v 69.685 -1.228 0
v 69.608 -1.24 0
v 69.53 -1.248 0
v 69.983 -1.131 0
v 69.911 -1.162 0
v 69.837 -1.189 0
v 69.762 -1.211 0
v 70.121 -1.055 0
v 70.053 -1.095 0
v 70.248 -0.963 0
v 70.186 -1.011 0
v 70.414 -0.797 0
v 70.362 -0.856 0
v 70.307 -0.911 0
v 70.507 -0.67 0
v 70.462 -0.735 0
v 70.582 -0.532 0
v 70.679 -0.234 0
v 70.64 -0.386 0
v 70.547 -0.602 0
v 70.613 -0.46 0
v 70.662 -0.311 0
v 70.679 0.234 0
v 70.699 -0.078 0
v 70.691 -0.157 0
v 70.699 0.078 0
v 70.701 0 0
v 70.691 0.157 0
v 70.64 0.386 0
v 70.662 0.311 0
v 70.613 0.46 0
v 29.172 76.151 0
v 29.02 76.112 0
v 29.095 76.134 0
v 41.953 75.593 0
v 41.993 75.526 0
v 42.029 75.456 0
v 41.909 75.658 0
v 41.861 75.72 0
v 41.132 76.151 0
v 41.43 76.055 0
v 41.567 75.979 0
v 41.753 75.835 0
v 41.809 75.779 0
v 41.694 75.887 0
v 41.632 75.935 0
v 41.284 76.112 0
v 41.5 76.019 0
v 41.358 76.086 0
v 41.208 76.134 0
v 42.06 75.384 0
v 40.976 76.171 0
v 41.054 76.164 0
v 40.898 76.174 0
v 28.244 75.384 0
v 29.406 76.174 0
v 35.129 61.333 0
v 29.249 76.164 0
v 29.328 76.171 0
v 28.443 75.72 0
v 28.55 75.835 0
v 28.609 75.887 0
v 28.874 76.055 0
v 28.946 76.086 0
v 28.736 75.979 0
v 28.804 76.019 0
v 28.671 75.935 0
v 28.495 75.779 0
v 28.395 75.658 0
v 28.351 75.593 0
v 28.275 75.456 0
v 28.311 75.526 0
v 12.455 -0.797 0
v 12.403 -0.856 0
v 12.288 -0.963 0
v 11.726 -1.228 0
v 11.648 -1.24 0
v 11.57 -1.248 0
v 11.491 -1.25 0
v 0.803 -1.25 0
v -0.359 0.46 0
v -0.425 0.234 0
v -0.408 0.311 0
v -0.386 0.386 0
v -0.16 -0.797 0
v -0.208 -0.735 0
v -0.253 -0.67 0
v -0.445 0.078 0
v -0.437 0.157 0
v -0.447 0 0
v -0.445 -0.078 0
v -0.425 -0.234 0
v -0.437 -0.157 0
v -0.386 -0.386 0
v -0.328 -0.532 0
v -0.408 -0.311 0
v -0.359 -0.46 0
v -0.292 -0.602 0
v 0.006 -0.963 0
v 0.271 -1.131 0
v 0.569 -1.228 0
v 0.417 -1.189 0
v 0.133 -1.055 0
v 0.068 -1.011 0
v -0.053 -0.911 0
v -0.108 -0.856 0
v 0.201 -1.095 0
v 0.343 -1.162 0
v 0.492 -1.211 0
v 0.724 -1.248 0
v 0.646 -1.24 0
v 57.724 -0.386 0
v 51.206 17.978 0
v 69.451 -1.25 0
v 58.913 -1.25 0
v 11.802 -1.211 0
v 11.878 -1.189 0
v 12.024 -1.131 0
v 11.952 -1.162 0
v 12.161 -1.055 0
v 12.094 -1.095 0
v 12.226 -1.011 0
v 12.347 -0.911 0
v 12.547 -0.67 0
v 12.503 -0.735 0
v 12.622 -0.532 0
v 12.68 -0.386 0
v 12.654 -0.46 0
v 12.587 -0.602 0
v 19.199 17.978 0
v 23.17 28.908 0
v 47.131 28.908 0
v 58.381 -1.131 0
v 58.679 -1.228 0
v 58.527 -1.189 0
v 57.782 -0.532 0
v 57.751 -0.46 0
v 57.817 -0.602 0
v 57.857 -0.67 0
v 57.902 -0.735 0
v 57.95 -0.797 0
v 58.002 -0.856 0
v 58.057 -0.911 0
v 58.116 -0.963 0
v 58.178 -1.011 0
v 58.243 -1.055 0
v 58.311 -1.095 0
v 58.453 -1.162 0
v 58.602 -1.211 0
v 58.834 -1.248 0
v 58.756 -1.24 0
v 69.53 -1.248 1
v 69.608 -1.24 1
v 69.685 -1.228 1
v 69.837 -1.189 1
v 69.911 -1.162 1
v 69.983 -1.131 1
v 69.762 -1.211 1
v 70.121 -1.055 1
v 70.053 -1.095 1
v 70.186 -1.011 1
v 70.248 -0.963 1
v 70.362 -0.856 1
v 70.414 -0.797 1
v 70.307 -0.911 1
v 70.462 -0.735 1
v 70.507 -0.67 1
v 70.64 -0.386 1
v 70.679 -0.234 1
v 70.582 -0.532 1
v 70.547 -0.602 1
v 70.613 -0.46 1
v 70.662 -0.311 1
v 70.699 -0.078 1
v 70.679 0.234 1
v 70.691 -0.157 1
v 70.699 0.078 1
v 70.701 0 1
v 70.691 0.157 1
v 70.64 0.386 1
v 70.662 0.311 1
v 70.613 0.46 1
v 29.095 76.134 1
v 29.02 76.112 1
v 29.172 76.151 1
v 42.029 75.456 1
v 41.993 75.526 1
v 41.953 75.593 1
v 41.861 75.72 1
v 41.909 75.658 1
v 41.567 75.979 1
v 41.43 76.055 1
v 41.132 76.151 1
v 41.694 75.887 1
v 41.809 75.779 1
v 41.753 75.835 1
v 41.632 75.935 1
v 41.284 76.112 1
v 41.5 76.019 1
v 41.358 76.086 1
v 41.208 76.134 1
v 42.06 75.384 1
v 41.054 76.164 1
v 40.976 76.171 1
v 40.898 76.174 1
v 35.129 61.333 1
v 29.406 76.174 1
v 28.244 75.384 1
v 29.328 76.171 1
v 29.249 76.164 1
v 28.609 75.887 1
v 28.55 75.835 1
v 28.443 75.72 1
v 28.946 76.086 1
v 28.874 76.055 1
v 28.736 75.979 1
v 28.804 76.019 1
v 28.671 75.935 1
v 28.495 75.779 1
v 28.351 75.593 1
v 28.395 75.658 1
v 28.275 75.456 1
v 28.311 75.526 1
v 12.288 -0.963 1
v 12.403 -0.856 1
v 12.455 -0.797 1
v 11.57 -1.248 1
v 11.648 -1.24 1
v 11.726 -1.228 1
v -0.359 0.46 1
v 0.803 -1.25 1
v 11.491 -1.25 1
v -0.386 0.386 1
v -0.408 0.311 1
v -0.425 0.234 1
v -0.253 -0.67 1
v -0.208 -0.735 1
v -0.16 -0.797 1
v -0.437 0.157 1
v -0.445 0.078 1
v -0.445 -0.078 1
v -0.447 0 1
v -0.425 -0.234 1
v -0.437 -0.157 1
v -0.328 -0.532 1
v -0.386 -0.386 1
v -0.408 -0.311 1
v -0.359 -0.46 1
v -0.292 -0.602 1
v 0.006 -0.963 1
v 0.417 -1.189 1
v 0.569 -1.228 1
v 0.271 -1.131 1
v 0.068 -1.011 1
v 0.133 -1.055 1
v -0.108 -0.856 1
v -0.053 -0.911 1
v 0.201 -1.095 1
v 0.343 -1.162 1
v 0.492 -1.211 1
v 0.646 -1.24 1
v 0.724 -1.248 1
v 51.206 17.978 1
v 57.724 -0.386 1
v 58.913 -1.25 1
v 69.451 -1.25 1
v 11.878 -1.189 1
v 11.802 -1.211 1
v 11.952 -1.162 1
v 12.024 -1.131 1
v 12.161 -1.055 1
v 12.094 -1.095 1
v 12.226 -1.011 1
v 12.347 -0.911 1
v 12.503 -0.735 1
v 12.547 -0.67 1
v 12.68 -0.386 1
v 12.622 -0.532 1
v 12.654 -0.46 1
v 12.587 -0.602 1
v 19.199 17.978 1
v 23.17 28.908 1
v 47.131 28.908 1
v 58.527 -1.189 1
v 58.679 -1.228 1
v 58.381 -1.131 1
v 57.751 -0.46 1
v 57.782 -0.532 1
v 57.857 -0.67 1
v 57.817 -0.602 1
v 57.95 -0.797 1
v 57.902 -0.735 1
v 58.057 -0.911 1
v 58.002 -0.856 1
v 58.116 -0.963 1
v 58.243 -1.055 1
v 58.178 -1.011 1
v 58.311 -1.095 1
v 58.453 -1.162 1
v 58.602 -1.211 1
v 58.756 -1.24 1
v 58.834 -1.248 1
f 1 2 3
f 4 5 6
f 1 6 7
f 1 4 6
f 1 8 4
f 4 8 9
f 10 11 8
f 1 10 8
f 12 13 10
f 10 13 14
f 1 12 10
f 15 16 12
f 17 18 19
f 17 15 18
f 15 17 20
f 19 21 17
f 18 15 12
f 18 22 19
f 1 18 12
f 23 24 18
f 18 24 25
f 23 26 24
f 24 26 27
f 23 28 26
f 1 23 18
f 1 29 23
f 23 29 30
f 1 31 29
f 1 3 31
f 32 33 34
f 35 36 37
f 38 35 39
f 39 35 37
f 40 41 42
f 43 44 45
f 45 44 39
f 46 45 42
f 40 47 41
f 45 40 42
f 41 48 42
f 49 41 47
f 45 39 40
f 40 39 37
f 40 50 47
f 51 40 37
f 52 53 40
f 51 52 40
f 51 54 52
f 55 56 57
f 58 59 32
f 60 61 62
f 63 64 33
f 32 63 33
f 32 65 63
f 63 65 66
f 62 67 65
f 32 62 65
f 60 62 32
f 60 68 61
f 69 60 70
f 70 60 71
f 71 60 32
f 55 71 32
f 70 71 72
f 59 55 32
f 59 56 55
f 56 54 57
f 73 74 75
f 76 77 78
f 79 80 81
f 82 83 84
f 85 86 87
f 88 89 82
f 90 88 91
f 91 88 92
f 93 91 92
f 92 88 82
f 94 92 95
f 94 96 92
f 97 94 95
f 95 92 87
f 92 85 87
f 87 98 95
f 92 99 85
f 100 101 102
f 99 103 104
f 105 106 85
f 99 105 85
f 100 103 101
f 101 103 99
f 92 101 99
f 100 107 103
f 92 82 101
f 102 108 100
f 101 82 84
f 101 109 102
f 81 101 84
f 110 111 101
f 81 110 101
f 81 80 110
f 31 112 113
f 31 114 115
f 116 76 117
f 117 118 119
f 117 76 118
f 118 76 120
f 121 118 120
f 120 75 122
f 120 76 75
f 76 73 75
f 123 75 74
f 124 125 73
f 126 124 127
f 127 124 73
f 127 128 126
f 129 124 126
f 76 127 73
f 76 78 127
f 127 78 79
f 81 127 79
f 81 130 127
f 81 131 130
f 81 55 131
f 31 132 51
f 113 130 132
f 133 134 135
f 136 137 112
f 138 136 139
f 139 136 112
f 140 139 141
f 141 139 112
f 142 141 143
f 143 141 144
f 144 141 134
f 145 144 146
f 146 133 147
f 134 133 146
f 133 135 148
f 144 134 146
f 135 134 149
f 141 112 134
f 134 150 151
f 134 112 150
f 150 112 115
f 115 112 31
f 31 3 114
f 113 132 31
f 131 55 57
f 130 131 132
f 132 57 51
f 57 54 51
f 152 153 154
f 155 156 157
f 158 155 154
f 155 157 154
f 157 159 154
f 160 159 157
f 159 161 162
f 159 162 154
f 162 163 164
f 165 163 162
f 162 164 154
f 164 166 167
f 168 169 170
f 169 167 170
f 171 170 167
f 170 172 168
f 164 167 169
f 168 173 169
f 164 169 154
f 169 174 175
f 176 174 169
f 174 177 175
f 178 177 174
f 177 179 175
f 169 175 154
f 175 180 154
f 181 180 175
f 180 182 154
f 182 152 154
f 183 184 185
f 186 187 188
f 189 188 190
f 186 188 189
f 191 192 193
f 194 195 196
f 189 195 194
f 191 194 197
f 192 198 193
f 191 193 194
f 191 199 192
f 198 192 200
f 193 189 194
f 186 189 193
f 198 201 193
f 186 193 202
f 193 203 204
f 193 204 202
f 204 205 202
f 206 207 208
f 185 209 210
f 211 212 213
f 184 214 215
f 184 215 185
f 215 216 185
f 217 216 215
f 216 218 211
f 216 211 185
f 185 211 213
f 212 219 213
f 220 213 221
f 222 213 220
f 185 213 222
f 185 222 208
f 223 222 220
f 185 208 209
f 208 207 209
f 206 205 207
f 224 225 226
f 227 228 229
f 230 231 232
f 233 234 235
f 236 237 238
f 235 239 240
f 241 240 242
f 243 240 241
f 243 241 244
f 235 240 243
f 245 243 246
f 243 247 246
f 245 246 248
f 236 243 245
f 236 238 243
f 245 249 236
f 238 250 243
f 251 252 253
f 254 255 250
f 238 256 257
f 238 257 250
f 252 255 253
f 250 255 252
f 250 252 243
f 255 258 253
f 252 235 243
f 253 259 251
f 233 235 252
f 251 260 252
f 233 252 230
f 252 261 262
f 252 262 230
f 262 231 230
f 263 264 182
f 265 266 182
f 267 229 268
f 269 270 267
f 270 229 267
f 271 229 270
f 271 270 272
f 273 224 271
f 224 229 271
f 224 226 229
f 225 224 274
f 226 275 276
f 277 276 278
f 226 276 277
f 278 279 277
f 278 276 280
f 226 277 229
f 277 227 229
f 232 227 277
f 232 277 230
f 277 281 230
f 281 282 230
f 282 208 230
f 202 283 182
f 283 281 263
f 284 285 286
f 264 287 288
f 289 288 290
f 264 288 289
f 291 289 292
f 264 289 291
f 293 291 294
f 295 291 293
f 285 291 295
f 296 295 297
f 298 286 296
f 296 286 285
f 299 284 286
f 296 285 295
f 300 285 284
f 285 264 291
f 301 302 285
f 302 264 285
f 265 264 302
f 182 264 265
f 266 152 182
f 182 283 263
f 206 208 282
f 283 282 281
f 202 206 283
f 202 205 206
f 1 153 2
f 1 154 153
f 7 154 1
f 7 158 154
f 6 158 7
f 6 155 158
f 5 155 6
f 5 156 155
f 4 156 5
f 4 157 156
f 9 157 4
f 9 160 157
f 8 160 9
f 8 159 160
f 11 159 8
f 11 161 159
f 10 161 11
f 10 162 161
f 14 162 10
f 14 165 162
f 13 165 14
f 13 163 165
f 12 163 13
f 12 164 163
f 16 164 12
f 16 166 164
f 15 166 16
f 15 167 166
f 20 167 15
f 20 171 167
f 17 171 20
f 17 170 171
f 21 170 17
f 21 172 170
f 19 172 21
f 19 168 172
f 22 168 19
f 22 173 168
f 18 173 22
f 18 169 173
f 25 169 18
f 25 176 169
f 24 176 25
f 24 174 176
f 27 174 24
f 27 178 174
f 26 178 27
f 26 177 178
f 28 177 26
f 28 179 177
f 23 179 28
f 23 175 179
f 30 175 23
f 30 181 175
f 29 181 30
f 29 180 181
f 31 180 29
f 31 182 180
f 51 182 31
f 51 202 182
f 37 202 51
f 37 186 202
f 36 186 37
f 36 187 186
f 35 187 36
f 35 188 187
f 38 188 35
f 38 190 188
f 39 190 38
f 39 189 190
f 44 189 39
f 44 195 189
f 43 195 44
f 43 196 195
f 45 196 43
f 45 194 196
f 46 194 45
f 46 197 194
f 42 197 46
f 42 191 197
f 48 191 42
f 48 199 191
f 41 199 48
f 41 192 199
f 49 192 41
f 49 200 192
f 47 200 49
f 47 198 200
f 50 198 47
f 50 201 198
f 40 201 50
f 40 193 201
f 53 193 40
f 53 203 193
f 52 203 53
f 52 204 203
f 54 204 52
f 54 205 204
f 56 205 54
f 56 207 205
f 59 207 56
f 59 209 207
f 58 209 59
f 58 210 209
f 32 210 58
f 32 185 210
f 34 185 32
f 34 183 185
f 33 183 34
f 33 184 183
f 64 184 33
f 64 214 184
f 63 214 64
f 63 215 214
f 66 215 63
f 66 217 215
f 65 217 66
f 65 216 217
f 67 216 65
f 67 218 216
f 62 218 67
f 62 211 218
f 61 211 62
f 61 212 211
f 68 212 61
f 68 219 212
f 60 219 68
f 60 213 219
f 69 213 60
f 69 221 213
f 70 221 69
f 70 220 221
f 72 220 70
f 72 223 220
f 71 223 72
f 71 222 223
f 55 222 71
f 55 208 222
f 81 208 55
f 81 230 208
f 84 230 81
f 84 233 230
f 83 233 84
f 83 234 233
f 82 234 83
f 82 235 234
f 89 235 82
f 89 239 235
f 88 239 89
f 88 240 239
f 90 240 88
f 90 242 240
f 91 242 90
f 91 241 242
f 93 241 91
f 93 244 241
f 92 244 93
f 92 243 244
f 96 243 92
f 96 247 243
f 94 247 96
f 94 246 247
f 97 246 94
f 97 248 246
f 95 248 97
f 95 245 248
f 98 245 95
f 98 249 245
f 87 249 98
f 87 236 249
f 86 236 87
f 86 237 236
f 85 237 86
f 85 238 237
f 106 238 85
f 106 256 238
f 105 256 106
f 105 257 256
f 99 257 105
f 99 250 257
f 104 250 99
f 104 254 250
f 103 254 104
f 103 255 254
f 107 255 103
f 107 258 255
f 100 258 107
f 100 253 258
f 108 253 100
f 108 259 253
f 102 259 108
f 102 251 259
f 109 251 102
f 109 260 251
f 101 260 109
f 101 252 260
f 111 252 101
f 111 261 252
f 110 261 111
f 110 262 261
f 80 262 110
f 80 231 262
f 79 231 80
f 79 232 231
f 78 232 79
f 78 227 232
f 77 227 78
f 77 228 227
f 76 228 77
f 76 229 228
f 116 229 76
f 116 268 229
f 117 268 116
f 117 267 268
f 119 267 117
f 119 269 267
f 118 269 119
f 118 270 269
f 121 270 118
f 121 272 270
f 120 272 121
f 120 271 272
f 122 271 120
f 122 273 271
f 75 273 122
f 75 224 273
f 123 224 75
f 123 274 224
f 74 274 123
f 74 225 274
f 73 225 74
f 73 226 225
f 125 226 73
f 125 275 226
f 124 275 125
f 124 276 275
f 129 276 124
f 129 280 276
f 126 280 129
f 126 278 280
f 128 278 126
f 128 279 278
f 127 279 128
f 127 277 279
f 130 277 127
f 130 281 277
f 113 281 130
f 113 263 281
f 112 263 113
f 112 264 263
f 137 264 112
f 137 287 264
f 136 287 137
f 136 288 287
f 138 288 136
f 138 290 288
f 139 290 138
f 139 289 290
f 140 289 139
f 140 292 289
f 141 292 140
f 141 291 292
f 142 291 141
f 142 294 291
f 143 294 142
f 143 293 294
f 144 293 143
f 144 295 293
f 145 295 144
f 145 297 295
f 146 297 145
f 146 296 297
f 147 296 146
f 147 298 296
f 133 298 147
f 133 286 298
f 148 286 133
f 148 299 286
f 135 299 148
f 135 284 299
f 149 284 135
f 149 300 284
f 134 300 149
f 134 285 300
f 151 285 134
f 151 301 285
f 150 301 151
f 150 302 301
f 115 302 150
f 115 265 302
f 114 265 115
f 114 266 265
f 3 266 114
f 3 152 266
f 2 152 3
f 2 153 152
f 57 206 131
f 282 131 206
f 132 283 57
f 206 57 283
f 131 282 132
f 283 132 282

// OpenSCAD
//Sign front-face generator V3 - bigclivedotcom
//All variables must match the sign body sizes
letter = "A"; //Sign character to make
style = "Noto Mono"; //See "Help" and "Font List"
size = 80; //Size of character
$fn=100; //Curve facets - higher is smoother
walls = 3; //Side wall thickness
face = 1; //Face thickness
fit = 0.5; //Slight shrink of face for easier fitting
//Don't change variables below here
sized=size-(2*walls);
linear_extrude(height=face)
minkowski(){
     text(letter,sized,style);
     circle((walls/2)-fit/2);
}
